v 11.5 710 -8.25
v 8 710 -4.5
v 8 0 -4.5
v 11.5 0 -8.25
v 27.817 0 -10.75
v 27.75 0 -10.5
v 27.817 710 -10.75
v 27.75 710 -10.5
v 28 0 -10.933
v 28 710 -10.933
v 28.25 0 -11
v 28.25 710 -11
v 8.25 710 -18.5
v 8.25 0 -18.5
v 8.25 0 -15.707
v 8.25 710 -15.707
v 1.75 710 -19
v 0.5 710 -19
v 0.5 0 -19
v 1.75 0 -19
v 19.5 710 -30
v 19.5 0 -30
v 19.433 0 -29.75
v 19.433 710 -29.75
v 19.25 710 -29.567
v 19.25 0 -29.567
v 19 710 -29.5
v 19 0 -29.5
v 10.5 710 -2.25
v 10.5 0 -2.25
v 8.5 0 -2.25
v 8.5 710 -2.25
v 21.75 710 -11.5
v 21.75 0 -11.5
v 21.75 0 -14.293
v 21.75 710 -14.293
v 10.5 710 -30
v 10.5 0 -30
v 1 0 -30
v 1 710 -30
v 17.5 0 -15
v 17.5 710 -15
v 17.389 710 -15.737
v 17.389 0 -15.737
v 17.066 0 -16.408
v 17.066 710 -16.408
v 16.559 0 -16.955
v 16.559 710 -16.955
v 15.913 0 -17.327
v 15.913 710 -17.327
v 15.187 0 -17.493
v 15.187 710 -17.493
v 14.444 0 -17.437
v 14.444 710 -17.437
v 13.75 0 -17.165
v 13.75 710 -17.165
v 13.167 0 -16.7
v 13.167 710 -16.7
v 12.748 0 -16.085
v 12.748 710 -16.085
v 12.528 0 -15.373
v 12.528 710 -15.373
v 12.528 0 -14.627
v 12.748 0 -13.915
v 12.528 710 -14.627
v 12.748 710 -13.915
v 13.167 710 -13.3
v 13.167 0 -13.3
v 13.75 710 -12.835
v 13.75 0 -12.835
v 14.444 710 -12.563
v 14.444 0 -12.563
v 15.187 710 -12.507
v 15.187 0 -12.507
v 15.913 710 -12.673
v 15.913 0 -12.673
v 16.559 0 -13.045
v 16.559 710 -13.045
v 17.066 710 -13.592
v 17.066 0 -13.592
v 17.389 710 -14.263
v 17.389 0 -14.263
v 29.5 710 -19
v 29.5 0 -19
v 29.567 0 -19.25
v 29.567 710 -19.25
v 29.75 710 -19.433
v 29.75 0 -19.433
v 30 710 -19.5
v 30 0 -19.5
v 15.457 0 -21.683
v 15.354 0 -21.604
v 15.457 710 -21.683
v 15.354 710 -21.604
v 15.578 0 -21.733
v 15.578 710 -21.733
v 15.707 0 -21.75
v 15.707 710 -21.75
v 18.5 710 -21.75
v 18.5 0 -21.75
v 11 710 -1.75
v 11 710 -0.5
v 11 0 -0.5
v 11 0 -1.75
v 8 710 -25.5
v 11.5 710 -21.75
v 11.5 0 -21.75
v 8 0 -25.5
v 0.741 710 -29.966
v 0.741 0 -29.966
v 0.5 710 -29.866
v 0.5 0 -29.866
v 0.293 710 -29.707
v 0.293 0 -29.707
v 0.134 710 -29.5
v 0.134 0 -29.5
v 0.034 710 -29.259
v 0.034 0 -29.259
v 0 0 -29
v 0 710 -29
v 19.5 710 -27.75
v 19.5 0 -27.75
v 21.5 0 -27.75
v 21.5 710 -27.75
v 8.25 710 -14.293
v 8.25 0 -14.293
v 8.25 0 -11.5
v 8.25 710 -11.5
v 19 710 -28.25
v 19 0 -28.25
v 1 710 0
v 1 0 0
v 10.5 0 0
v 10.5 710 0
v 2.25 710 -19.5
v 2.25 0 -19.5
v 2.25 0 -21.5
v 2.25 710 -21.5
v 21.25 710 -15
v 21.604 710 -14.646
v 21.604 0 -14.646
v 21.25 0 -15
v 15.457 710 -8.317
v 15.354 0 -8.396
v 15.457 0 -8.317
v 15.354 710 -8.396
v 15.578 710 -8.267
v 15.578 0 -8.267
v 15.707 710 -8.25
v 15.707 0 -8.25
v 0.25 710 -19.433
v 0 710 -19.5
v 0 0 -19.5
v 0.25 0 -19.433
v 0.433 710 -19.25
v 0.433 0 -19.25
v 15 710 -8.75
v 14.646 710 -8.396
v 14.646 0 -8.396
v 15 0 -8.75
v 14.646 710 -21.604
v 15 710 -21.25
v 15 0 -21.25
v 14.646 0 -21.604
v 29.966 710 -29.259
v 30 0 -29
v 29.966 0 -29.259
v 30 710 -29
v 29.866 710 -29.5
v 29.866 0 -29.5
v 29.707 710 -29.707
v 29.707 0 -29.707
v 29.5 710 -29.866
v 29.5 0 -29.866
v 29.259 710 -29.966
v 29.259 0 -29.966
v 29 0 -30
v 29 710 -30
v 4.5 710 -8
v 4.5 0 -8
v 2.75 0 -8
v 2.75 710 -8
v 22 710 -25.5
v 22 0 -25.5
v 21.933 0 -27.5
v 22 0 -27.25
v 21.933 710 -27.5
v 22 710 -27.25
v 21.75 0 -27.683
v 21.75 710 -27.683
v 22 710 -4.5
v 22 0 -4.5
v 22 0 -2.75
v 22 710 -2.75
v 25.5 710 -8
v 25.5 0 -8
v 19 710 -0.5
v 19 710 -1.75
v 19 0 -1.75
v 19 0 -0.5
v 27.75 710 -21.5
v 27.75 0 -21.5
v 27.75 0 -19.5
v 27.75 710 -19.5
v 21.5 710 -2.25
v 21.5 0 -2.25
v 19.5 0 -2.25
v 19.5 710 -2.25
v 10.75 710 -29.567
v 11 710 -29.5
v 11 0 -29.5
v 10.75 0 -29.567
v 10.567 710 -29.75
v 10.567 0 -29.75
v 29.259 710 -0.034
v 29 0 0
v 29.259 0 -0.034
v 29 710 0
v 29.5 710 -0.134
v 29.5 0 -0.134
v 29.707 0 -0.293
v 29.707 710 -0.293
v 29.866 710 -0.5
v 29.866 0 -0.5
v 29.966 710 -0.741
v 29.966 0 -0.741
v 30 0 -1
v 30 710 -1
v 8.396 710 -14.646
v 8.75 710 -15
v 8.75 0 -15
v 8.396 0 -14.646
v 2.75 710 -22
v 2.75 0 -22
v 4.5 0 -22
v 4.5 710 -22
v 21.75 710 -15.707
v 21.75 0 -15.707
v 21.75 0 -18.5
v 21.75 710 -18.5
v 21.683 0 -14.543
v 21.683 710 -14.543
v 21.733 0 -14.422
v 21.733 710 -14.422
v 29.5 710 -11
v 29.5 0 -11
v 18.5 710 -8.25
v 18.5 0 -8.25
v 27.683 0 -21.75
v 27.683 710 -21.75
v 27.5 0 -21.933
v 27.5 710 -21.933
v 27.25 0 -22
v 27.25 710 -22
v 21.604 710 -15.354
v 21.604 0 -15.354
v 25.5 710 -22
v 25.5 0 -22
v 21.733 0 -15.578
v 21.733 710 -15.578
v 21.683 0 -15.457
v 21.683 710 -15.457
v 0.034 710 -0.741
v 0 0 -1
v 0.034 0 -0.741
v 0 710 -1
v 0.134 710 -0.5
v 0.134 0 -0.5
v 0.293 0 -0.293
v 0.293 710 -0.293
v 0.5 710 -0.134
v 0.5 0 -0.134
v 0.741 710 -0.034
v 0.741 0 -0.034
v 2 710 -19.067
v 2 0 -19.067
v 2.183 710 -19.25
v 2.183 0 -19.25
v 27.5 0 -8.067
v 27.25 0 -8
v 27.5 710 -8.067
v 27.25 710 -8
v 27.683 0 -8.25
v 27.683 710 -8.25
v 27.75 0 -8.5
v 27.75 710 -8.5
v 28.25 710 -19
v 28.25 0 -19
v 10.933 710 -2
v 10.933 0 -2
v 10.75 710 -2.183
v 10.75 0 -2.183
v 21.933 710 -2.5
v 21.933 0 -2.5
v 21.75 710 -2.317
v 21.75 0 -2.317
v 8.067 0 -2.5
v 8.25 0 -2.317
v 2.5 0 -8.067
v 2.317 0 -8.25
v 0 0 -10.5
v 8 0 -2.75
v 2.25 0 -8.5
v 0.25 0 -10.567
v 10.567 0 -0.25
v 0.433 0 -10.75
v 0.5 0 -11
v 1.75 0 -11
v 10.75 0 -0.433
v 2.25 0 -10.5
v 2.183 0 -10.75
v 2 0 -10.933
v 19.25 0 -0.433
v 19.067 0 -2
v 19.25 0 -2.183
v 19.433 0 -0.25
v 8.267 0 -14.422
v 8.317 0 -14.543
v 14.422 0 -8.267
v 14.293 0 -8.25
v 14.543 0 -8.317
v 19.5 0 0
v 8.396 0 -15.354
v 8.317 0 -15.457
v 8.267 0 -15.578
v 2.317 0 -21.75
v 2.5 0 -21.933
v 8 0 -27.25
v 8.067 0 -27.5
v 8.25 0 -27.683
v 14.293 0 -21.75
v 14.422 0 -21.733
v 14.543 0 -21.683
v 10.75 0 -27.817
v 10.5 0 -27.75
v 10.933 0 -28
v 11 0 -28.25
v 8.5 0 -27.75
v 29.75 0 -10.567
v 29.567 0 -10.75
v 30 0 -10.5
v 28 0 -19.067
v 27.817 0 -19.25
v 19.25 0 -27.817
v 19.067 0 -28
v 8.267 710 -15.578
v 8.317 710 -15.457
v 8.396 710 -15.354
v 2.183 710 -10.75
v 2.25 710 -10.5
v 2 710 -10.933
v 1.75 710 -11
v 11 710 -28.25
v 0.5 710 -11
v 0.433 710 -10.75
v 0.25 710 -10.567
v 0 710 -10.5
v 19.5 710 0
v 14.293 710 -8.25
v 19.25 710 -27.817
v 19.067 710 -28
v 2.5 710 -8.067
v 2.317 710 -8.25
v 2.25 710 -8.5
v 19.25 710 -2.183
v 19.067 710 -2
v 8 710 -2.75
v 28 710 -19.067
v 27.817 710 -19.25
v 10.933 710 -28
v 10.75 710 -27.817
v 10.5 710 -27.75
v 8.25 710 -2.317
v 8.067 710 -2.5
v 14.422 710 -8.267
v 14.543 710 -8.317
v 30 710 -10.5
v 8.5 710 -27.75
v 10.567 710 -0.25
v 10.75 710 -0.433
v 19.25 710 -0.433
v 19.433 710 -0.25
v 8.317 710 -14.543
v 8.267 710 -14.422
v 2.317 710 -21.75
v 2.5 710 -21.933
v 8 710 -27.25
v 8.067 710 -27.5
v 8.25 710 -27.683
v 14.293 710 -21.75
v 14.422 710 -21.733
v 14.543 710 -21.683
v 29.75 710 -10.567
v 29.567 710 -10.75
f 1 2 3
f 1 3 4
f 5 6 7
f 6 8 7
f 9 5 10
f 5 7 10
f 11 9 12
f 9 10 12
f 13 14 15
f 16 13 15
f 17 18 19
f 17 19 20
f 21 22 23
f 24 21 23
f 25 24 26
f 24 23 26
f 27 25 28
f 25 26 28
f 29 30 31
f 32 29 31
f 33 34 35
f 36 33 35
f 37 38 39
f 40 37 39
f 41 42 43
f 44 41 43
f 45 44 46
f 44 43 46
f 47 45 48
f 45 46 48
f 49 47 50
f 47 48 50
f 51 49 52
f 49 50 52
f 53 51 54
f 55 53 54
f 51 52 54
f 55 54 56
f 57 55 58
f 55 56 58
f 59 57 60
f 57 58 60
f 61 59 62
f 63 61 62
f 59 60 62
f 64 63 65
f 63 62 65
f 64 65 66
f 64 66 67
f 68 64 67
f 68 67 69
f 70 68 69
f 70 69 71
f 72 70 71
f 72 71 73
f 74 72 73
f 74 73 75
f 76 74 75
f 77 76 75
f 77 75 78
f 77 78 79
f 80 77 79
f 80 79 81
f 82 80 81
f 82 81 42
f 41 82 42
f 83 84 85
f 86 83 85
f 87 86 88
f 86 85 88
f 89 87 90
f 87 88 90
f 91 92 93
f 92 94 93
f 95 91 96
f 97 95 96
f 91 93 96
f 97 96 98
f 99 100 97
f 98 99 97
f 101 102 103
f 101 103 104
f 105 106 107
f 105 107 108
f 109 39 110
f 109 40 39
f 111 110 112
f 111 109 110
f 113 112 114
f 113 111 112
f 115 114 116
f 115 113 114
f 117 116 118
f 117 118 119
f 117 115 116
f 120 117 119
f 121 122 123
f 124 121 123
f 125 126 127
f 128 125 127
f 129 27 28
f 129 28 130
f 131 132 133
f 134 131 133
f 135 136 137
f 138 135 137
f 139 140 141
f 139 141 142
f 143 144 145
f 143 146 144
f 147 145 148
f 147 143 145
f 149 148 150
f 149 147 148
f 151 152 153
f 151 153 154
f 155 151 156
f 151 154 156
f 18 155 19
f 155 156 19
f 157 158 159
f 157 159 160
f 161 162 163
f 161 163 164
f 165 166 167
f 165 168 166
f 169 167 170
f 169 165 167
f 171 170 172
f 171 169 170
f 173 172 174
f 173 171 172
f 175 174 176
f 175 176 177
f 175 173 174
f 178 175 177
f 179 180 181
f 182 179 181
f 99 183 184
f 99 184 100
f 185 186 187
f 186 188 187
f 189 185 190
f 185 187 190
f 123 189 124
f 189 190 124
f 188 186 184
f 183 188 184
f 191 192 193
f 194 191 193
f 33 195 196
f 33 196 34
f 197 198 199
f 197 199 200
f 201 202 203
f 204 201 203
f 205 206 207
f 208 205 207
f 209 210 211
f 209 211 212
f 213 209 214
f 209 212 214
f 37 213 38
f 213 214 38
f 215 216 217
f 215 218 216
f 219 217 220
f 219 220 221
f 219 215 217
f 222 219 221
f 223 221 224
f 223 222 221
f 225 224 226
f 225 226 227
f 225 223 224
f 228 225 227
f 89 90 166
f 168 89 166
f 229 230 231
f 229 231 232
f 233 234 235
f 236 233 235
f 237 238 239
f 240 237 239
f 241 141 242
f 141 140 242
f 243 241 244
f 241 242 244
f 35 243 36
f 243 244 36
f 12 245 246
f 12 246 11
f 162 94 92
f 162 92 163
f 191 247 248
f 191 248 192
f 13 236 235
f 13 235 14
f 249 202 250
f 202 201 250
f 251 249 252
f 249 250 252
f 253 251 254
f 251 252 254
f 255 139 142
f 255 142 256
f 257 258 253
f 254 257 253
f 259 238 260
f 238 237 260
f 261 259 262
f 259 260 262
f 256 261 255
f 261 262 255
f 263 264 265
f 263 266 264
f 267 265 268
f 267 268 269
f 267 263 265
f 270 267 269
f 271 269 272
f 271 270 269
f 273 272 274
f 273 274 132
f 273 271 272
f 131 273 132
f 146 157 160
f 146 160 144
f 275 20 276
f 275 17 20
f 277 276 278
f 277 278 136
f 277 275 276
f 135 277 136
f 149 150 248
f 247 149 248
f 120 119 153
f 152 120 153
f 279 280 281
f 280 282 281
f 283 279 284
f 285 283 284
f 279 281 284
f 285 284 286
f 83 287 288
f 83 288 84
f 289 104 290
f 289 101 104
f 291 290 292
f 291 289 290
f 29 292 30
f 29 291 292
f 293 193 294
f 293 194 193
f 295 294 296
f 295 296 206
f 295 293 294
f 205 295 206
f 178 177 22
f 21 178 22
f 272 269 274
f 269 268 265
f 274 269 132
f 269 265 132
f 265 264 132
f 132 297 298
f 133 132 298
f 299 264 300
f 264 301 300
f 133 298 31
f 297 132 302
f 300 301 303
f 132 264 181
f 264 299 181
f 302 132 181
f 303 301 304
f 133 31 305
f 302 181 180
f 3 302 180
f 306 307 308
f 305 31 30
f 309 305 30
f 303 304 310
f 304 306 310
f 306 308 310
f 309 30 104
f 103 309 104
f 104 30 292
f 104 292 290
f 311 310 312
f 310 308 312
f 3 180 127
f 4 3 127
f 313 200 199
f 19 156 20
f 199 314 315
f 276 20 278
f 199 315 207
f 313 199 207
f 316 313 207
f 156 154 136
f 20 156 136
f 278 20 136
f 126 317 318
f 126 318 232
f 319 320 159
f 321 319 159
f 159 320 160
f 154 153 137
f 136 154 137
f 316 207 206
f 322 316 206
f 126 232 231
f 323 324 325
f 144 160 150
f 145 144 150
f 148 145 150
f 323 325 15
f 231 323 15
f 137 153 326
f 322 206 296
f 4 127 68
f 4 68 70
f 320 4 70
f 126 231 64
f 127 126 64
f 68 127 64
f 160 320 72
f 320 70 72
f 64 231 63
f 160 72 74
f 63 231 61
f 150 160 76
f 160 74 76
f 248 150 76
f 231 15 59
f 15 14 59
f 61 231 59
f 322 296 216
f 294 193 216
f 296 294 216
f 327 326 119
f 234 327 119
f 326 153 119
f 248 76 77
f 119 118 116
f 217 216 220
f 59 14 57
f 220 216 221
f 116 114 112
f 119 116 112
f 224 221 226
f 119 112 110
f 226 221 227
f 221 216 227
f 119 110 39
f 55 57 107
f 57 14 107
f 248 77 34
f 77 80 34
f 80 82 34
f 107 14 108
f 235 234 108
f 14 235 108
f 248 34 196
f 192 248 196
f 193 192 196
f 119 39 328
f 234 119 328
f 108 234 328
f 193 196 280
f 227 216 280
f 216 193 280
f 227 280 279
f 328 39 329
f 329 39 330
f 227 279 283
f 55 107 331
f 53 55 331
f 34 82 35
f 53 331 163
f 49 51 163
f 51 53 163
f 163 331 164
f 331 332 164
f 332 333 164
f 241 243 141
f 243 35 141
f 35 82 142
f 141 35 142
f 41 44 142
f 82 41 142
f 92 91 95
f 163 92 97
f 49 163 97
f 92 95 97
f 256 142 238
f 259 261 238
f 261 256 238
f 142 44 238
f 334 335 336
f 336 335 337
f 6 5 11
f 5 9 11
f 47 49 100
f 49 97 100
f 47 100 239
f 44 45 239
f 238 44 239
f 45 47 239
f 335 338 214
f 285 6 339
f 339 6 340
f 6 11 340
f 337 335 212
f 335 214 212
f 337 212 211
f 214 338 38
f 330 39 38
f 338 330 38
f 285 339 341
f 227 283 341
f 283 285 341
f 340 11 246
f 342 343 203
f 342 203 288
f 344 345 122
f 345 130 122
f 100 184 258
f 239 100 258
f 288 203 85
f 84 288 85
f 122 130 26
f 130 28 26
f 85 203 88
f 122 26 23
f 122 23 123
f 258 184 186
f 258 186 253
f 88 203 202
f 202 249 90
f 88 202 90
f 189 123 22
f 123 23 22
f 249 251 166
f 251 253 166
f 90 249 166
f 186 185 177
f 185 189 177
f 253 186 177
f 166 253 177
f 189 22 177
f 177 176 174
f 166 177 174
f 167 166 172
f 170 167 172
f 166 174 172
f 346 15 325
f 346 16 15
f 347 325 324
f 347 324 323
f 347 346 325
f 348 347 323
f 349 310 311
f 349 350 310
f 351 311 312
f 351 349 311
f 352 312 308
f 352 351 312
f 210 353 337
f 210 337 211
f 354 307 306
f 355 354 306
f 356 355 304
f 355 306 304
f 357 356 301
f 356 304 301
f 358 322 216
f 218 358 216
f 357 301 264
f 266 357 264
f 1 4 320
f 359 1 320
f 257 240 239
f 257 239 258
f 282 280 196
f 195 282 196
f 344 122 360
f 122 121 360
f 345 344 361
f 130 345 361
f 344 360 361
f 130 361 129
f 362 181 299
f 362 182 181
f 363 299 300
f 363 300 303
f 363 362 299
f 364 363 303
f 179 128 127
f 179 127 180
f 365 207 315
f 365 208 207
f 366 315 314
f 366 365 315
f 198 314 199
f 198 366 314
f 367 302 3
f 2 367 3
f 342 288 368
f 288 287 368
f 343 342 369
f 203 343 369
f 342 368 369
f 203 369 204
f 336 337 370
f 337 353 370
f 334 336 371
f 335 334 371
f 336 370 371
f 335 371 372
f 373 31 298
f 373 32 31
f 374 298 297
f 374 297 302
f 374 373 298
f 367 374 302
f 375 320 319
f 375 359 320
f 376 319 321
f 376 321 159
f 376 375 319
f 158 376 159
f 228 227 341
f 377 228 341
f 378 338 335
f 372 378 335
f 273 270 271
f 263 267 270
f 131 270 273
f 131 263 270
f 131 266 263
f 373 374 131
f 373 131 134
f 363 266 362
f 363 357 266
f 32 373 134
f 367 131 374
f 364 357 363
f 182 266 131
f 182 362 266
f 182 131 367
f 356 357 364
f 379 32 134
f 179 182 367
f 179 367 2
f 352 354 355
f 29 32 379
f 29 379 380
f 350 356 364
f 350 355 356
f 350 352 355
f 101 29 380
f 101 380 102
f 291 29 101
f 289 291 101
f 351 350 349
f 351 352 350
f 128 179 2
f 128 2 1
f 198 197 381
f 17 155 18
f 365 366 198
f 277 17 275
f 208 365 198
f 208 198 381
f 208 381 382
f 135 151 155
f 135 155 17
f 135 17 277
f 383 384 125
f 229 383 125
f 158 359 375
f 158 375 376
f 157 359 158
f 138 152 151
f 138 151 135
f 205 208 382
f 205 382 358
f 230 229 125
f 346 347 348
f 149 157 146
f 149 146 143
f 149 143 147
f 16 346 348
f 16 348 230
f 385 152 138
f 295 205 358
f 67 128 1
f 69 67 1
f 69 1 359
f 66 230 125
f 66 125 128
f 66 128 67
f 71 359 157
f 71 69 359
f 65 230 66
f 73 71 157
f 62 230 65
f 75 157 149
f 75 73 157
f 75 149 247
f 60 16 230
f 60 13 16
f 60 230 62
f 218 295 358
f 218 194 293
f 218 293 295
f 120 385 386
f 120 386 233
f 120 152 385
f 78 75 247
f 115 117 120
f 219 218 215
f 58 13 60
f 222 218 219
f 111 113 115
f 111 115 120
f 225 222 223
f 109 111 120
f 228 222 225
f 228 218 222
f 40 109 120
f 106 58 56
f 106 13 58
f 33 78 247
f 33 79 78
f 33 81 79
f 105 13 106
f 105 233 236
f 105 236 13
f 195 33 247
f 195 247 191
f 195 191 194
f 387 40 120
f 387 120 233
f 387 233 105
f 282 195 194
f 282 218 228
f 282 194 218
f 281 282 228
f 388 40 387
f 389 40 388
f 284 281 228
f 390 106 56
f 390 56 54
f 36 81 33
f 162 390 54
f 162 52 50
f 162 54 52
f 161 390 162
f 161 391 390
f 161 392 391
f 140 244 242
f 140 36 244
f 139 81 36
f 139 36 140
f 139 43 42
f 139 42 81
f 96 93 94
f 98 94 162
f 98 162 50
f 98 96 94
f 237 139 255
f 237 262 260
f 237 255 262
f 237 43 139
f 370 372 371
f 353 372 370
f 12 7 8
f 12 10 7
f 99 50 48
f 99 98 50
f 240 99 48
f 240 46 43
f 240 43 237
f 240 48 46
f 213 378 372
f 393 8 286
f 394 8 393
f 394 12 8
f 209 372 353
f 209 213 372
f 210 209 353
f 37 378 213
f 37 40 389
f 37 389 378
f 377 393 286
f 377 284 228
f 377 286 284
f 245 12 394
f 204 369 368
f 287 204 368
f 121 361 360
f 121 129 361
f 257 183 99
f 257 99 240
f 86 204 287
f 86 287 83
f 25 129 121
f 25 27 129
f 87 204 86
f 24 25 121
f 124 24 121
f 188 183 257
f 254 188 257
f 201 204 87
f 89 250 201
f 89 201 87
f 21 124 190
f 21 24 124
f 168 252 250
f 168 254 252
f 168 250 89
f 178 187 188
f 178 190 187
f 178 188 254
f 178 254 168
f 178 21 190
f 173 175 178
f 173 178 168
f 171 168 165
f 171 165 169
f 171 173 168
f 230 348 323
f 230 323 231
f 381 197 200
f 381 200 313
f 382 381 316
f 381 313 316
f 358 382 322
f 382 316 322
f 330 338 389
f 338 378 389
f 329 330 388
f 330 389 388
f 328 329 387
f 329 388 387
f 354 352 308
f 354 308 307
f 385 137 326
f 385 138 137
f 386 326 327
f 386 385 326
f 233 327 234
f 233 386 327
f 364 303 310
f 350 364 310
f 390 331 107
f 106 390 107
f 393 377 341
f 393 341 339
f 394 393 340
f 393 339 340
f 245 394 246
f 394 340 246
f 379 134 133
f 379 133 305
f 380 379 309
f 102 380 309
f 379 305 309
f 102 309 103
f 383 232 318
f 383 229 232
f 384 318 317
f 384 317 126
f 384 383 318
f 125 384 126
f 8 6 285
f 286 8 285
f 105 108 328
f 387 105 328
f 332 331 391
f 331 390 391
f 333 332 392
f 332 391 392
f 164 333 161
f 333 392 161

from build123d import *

# Parameters (mm, degrees)
BOSS_EXTRUDE1_DEPTH = 710
FILLET1_R           = 1
SKETCH4_R           = 2.5
CUT_EXTRUDE1_DEPTH  = 711
FILLET2_R           = 0.5


with BuildPart() as part:
    # Sketch3 → Boss-Extrude1 (new body)
    with BuildSketch(Plane(origin=(0, 0, 0), x_dir=(1, 0, 0), z_dir=(0, 1, 0))):
        with BuildLine():
            Line((11, 27.75), (11, 29.5))
            ThreePointArc((11, 29.5), (10.646446609, 29.646446609), (10.5, 30))
            Line((10.5, 30), (0, 30))
            Line((0, 30), (0, 19.5))
            ThreePointArc((0, 19.5), (0.353553391, 19.353553391), (0.5, 19))
            Line((0.5, 19), (2.25, 19))
            Line((2.25, 19), (2.25, 22))
            Line((2.25, 22), (4.5, 22))
            Line((4.5, 22), (8.25, 18.5))
            Line((8.25, 18.5), (8.25, 15.5))
            Line((8.25, 15.5), (8.75, 15))
            Line((8.75, 15), (8.25, 14.5))
            Line((8.25, 14.5), (8.25, 11.5))
            Line((8.25, 11.5), (4.5, 8))
            Line((4.5, 8), (2.25, 8))
            Line((2.25, 8), (2.25, 11))
            Line((2.25, 11), (0.5, 11))
            ThreePointArc((0.5, 11), (0.353553391, 10.646446609), (0, 10.5))
            Line((0, 10.5), (0, 0))
            Line((0, 0), (10.5, 0))
            ThreePointArc((10.5, 0), (10.646446609, 0.353553391), (11, 0.5))
            Line((11, 0.5), (11, 2.25))
            Line((11, 2.25), (8, 2.25))
            Line((8, 2.25), (8, 4.5))
            Line((8, 4.5), (11.5, 8.25))
            Line((11.5, 8.25), (14.5, 8.25))
            Line((14.5, 8.25), (15, 8.75))
            Line((15, 8.75), (15.5, 8.25))
            Line((15.5, 8.25), (18.5, 8.25))
            Line((18.5, 8.25), (22, 4.5))
            Line((22, 4.5), (22, 2.25))
            Line((22, 2.25), (19, 2.25))
            Line((19, 2.25), (19, 0.5))
            ThreePointArc((19, 0.5), (19.353553391, 0.353553391), (19.5, 0))
            Line((19.5, 0), (30, 0))
            Line((30, 0), (30, 10.5))
            ThreePointArc((30, 10.5), (29.646446609, 10.646446609), (29.5, 11))
            Line((29.5, 11), (27.75, 11))
            Line((27.75, 11), (27.75, 8))
            Line((27.75, 8), (25.5, 8))
            Line((25.5, 8), (21.75, 11.5))
            Line((21.75, 11.5), (21.75, 14.5))
            Line((21.75, 14.5), (21.25, 15))
            Line((21.25, 15), (21.75, 15.5))
            Line((21.75, 15.5), (21.75, 18.5))
            Line((21.75, 18.5), (25.5, 22))
            Line((25.5, 22), (27.75, 22))
            Line((27.75, 22), (27.75, 19))
            Line((27.75, 19), (29.5, 19))
            ThreePointArc((29.5, 19), (29.646446609, 19.353553391), (30, 19.5))
            Line((30, 19.5), (30, 30))
            Line((30, 30), (19.5, 30))
            ThreePointArc((19.5, 30), (19.353553391, 29.646446609), (19, 29.5))
            Line((19, 29.5), (19, 27.75))
            Line((19, 27.75), (22, 27.75))
            Line((22, 27.75), (22, 25.5))
            Line((22, 25.5), (18.5, 21.75))
            Line((18.5, 21.75), (15.5, 21.75))
            Line((15.5, 21.75), (15, 21.25))
            Line((15, 21.25), (14.5, 21.75))
            Line((14.5, 21.75), (11.5, 21.75))
            Line((11.5, 21.75), (8, 25.5))
            Line((8, 25.5), (8, 27.75))
            Line((8, 27.75), (11, 27.75))
        make_face()
    extrude(amount=BOSS_EXTRUDE1_DEPTH)

    # Fillet1
    fillet1_edges = [part.edges().sort_by_distance(p)[0] for p in [
        (30, 355, 0),
        (0, 355, 0),
        (0, 355, -30),
        (30, 355, -30),
    ]]
    fillet(fillet1_edges, radius=FILLET1_R)

    # Sketch4 → Cut-Extrude1 (cut, through all)
    with BuildSketch(Plane(origin=(0, 710, 0), x_dir=(1, 0, 0), z_dir=(0, 1, 0))):
        with Locations((15, 15)):
            Circle(SKETCH4_R)
    extrude(amount=-CUT_EXTRUDE1_DEPTH, mode=Mode.SUBTRACT)

    # Fillet2
    fillet2_edges = [part.edges().sort_by_distance(p)[0] for p in [
        (27.75, 355, -19),
        (27.75, 355, -22),
        (21.75, 355, -15.5),
        (21.75, 355, -14.5),
        (27.75, 355, -8),
        (27.75, 355, -11),
        (19, 355, -2.25),
        (22, 355, -2.25),
        (15.5, 355, -8.25),
        (14.5, 355, -8.25),
        (8, 355, -2.25),
        (11, 355, -2.25),
        (2.25, 355, -11),
        (2.25, 355, -8),
        (8.25, 355, -14.5),
        (8.25, 355, -15.5),
        (2.25, 355, -22),
        (2.25, 355, -19),
        (11, 355, -27.75),
        (8, 355, -27.75),
        (14.5, 355, -21.75),
        (15.5, 355, -21.75),
        (22, 355, -27.75),
        (19, 355, -27.75),
    ]]
    fillet(fillet2_edges, radius=FILLET2_R)


solid = part.part
